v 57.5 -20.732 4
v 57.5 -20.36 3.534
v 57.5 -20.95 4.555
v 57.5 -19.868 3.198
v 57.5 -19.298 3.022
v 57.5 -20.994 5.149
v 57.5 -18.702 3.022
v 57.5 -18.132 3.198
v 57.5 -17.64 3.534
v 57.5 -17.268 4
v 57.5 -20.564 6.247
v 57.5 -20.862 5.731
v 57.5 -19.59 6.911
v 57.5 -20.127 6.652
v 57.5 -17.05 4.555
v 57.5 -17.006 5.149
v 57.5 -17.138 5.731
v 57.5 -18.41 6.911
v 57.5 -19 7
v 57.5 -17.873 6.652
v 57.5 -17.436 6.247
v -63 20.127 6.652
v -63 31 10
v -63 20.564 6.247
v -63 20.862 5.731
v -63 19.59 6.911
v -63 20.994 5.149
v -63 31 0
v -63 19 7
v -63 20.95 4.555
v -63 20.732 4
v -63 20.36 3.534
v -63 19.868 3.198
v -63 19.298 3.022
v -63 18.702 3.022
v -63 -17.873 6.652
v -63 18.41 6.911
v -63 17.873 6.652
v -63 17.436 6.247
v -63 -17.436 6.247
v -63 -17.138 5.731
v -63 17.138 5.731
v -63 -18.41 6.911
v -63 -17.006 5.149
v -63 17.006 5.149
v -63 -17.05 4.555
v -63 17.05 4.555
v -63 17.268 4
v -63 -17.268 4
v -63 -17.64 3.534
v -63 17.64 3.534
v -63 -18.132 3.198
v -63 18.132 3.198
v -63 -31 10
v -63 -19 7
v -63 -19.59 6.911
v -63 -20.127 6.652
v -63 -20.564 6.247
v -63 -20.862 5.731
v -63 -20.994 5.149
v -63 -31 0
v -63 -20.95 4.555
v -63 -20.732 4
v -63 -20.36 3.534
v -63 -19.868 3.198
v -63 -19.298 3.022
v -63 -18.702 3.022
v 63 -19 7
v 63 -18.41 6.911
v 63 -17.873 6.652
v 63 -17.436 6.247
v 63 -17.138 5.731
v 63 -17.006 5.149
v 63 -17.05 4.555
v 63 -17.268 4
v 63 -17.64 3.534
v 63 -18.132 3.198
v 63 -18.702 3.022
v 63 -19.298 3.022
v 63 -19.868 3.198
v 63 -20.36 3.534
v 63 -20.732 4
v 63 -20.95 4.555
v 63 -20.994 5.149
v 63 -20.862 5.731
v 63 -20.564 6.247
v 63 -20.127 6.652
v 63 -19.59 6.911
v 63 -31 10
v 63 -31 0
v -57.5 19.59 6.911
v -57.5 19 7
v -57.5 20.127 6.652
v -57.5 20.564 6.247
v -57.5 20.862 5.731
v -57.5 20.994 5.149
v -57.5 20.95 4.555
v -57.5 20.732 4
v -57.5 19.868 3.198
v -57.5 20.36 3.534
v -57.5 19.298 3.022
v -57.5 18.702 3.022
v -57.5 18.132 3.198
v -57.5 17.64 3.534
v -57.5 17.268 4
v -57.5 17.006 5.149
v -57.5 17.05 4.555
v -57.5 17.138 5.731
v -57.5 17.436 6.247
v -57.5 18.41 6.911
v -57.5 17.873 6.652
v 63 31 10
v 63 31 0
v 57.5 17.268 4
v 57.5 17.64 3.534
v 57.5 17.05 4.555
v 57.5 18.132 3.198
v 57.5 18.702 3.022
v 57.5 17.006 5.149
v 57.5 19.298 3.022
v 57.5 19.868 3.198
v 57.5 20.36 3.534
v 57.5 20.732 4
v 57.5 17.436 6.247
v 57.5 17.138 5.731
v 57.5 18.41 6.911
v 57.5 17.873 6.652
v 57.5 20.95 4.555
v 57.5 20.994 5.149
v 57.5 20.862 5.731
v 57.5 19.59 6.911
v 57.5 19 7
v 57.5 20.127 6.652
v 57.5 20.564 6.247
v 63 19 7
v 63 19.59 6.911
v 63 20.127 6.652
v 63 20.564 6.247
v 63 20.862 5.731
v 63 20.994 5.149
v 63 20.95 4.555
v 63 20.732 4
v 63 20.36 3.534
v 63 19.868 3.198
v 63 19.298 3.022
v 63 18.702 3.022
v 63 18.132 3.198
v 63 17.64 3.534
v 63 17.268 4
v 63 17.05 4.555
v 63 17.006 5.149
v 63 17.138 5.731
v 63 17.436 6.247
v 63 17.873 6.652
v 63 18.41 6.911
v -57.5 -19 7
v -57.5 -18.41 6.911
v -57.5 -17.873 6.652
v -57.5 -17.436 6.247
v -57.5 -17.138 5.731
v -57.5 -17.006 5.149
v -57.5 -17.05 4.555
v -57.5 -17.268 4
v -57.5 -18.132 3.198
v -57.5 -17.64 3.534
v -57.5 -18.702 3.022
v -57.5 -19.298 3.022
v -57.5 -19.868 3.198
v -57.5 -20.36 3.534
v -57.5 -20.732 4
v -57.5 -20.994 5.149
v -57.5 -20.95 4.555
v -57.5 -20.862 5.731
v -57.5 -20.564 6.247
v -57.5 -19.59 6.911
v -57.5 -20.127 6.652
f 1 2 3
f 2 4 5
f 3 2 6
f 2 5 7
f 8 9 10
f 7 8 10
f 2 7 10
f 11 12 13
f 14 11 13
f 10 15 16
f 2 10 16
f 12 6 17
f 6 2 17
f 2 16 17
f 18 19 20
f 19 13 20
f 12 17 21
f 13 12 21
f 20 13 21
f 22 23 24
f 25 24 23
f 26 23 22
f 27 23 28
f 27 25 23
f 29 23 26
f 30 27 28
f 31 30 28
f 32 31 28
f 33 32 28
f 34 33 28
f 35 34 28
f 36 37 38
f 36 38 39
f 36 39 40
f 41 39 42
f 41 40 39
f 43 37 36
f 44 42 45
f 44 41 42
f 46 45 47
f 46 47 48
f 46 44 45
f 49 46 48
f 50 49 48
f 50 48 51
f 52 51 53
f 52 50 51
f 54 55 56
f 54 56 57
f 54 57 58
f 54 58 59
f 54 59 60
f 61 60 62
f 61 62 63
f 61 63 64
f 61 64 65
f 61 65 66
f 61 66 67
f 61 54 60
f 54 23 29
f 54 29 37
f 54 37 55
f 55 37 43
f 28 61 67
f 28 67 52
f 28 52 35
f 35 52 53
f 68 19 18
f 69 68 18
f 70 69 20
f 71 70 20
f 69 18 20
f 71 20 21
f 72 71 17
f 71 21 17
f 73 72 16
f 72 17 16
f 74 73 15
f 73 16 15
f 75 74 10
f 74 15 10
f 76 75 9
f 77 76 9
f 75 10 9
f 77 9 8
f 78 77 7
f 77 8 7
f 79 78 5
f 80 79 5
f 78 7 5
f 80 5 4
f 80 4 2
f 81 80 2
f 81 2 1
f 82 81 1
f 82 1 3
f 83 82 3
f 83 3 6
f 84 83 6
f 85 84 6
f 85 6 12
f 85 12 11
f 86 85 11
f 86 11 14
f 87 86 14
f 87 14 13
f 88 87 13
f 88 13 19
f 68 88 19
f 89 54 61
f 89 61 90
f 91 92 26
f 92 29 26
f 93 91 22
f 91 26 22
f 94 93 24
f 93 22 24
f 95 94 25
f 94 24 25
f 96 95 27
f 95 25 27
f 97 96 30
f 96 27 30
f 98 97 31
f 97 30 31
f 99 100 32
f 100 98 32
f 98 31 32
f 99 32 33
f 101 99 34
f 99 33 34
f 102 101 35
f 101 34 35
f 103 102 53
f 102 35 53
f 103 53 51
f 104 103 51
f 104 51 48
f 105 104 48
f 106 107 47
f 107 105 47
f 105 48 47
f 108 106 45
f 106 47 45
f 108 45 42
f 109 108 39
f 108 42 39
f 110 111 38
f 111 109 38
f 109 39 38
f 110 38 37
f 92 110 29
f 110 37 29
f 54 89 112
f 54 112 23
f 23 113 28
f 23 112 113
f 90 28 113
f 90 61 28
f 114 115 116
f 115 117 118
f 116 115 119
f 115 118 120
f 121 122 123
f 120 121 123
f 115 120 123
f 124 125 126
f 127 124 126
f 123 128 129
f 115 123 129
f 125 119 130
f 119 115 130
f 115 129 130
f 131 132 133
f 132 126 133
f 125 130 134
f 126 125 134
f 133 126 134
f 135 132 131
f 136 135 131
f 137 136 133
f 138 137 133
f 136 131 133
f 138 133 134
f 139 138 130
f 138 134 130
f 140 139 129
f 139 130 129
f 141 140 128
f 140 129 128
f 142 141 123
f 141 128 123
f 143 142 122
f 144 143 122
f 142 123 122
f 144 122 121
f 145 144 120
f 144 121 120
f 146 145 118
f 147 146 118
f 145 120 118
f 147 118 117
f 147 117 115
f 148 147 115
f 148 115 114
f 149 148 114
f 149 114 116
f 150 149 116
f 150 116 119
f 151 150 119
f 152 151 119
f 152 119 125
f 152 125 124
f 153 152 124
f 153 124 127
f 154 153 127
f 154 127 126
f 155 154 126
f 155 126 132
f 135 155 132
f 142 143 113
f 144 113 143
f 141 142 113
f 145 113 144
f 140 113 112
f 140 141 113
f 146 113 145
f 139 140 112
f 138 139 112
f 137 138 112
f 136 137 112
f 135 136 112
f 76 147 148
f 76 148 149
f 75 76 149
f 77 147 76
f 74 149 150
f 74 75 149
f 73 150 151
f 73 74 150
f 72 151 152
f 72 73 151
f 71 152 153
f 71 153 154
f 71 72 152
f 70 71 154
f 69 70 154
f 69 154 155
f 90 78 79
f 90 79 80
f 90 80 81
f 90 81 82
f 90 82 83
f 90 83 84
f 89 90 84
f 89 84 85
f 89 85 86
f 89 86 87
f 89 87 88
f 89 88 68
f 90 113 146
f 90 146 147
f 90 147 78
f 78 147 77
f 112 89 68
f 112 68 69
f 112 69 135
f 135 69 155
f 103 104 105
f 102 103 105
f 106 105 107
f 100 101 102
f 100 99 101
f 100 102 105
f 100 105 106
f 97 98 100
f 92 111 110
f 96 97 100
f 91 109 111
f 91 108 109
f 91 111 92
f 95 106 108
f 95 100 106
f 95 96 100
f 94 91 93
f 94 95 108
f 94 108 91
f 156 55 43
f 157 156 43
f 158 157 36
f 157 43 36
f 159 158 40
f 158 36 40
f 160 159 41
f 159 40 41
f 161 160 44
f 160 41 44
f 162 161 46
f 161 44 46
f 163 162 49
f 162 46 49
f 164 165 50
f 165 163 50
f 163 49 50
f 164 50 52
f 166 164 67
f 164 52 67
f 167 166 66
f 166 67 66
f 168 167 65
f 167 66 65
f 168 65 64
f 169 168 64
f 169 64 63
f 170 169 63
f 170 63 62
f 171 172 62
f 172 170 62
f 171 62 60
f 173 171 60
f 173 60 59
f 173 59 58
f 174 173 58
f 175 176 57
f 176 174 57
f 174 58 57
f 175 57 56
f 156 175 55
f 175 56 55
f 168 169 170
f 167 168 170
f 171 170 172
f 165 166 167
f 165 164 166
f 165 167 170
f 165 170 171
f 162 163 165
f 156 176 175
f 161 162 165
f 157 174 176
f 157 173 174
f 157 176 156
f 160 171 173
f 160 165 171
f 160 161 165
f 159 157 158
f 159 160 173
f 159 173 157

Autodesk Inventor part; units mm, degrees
ref_plane "YZ Plane" through (0, 0, 0) normal (1, 0, 0) x (0, 1, 0)
ref_plane "XZ Plane" through (0, 0, 0) normal (0, 1, 0) x (-1, 0, 0)
ref_plane "XY Plane" through (0, 0, 0) normal (0, 0, 1) x (1, 0, 0)
sketch "Sketch1" plane through (0, 0, 0) normal (0, 0, 1) x (1, 0, 0)
  line L0 (-63, 30) -> (63, 30)
  line L1 (63, 30) -> (63, -30)
  line L2 (63, -30) -> (-63, -30)
  line L3 (-63, -30) -> (-63, 30)
  line L4 (-63, 30) -> (63, -30) construction
  line L5 (63, 30) -> (-63, -30) construction
  line L6 (-63, 30) -> (63, 30) construction
  point P0 (0, 0)
  dimension "d0" = 126
  dimension "d1" = 0
  dimension "d2" = 60
extrude "Extrusion1" add sketch "Sketch1" along normal blind 10
sketch "Sketch2" plane through (-63, -30, 0) normal (-1, 0, 0) x (0, 0, 1)
  line L0 (0, 60) -> (10, 60) projected
  line L1 (5, 60) -> (5, 49)
  circle A0 centre (5, 49) radius 2
  point P0 (0, 30)
  dimension "d5" = 11
  dimension "d6" = 4
extrude "Extrusion2" cut sketch "Sketch2" against normal blind 5.5
pattern_linear "Rectangular Pattern1" count 2 spacing 120.5 along (1, 0, 0) count 2 spacing -38 along (0, 1, 0) of "Extrusion2"
ref_plane "Work Plane1" through (-63, 0, 0) normal (0, 1, 0) x (1, 0, 0)
sketch "Sketch3" plane through (-63, -30, 0) normal (0, -1, 0) x (1, 0, 0)
  line L0 (0, 0) -> (0, 10) projected
  line L1 (126, 0) -> (0, 0) projected
  line L2 (0, 10) -> (126, 10)
  line L3 (126, 10) -> (126, 0)
  line L4 (126, 0) -> (0, 0)
  line L5 (0, 0) -> (0, 10)
  point P0 (63, 0)
extrude "Extrusion3" add sketch "Sketch3" along normal blind 1
mirror "Mirror1" about plane through (-63, 0, 0) normal (0, 1, 0) of "Extrusion3"
properties part number "basetemplate"
